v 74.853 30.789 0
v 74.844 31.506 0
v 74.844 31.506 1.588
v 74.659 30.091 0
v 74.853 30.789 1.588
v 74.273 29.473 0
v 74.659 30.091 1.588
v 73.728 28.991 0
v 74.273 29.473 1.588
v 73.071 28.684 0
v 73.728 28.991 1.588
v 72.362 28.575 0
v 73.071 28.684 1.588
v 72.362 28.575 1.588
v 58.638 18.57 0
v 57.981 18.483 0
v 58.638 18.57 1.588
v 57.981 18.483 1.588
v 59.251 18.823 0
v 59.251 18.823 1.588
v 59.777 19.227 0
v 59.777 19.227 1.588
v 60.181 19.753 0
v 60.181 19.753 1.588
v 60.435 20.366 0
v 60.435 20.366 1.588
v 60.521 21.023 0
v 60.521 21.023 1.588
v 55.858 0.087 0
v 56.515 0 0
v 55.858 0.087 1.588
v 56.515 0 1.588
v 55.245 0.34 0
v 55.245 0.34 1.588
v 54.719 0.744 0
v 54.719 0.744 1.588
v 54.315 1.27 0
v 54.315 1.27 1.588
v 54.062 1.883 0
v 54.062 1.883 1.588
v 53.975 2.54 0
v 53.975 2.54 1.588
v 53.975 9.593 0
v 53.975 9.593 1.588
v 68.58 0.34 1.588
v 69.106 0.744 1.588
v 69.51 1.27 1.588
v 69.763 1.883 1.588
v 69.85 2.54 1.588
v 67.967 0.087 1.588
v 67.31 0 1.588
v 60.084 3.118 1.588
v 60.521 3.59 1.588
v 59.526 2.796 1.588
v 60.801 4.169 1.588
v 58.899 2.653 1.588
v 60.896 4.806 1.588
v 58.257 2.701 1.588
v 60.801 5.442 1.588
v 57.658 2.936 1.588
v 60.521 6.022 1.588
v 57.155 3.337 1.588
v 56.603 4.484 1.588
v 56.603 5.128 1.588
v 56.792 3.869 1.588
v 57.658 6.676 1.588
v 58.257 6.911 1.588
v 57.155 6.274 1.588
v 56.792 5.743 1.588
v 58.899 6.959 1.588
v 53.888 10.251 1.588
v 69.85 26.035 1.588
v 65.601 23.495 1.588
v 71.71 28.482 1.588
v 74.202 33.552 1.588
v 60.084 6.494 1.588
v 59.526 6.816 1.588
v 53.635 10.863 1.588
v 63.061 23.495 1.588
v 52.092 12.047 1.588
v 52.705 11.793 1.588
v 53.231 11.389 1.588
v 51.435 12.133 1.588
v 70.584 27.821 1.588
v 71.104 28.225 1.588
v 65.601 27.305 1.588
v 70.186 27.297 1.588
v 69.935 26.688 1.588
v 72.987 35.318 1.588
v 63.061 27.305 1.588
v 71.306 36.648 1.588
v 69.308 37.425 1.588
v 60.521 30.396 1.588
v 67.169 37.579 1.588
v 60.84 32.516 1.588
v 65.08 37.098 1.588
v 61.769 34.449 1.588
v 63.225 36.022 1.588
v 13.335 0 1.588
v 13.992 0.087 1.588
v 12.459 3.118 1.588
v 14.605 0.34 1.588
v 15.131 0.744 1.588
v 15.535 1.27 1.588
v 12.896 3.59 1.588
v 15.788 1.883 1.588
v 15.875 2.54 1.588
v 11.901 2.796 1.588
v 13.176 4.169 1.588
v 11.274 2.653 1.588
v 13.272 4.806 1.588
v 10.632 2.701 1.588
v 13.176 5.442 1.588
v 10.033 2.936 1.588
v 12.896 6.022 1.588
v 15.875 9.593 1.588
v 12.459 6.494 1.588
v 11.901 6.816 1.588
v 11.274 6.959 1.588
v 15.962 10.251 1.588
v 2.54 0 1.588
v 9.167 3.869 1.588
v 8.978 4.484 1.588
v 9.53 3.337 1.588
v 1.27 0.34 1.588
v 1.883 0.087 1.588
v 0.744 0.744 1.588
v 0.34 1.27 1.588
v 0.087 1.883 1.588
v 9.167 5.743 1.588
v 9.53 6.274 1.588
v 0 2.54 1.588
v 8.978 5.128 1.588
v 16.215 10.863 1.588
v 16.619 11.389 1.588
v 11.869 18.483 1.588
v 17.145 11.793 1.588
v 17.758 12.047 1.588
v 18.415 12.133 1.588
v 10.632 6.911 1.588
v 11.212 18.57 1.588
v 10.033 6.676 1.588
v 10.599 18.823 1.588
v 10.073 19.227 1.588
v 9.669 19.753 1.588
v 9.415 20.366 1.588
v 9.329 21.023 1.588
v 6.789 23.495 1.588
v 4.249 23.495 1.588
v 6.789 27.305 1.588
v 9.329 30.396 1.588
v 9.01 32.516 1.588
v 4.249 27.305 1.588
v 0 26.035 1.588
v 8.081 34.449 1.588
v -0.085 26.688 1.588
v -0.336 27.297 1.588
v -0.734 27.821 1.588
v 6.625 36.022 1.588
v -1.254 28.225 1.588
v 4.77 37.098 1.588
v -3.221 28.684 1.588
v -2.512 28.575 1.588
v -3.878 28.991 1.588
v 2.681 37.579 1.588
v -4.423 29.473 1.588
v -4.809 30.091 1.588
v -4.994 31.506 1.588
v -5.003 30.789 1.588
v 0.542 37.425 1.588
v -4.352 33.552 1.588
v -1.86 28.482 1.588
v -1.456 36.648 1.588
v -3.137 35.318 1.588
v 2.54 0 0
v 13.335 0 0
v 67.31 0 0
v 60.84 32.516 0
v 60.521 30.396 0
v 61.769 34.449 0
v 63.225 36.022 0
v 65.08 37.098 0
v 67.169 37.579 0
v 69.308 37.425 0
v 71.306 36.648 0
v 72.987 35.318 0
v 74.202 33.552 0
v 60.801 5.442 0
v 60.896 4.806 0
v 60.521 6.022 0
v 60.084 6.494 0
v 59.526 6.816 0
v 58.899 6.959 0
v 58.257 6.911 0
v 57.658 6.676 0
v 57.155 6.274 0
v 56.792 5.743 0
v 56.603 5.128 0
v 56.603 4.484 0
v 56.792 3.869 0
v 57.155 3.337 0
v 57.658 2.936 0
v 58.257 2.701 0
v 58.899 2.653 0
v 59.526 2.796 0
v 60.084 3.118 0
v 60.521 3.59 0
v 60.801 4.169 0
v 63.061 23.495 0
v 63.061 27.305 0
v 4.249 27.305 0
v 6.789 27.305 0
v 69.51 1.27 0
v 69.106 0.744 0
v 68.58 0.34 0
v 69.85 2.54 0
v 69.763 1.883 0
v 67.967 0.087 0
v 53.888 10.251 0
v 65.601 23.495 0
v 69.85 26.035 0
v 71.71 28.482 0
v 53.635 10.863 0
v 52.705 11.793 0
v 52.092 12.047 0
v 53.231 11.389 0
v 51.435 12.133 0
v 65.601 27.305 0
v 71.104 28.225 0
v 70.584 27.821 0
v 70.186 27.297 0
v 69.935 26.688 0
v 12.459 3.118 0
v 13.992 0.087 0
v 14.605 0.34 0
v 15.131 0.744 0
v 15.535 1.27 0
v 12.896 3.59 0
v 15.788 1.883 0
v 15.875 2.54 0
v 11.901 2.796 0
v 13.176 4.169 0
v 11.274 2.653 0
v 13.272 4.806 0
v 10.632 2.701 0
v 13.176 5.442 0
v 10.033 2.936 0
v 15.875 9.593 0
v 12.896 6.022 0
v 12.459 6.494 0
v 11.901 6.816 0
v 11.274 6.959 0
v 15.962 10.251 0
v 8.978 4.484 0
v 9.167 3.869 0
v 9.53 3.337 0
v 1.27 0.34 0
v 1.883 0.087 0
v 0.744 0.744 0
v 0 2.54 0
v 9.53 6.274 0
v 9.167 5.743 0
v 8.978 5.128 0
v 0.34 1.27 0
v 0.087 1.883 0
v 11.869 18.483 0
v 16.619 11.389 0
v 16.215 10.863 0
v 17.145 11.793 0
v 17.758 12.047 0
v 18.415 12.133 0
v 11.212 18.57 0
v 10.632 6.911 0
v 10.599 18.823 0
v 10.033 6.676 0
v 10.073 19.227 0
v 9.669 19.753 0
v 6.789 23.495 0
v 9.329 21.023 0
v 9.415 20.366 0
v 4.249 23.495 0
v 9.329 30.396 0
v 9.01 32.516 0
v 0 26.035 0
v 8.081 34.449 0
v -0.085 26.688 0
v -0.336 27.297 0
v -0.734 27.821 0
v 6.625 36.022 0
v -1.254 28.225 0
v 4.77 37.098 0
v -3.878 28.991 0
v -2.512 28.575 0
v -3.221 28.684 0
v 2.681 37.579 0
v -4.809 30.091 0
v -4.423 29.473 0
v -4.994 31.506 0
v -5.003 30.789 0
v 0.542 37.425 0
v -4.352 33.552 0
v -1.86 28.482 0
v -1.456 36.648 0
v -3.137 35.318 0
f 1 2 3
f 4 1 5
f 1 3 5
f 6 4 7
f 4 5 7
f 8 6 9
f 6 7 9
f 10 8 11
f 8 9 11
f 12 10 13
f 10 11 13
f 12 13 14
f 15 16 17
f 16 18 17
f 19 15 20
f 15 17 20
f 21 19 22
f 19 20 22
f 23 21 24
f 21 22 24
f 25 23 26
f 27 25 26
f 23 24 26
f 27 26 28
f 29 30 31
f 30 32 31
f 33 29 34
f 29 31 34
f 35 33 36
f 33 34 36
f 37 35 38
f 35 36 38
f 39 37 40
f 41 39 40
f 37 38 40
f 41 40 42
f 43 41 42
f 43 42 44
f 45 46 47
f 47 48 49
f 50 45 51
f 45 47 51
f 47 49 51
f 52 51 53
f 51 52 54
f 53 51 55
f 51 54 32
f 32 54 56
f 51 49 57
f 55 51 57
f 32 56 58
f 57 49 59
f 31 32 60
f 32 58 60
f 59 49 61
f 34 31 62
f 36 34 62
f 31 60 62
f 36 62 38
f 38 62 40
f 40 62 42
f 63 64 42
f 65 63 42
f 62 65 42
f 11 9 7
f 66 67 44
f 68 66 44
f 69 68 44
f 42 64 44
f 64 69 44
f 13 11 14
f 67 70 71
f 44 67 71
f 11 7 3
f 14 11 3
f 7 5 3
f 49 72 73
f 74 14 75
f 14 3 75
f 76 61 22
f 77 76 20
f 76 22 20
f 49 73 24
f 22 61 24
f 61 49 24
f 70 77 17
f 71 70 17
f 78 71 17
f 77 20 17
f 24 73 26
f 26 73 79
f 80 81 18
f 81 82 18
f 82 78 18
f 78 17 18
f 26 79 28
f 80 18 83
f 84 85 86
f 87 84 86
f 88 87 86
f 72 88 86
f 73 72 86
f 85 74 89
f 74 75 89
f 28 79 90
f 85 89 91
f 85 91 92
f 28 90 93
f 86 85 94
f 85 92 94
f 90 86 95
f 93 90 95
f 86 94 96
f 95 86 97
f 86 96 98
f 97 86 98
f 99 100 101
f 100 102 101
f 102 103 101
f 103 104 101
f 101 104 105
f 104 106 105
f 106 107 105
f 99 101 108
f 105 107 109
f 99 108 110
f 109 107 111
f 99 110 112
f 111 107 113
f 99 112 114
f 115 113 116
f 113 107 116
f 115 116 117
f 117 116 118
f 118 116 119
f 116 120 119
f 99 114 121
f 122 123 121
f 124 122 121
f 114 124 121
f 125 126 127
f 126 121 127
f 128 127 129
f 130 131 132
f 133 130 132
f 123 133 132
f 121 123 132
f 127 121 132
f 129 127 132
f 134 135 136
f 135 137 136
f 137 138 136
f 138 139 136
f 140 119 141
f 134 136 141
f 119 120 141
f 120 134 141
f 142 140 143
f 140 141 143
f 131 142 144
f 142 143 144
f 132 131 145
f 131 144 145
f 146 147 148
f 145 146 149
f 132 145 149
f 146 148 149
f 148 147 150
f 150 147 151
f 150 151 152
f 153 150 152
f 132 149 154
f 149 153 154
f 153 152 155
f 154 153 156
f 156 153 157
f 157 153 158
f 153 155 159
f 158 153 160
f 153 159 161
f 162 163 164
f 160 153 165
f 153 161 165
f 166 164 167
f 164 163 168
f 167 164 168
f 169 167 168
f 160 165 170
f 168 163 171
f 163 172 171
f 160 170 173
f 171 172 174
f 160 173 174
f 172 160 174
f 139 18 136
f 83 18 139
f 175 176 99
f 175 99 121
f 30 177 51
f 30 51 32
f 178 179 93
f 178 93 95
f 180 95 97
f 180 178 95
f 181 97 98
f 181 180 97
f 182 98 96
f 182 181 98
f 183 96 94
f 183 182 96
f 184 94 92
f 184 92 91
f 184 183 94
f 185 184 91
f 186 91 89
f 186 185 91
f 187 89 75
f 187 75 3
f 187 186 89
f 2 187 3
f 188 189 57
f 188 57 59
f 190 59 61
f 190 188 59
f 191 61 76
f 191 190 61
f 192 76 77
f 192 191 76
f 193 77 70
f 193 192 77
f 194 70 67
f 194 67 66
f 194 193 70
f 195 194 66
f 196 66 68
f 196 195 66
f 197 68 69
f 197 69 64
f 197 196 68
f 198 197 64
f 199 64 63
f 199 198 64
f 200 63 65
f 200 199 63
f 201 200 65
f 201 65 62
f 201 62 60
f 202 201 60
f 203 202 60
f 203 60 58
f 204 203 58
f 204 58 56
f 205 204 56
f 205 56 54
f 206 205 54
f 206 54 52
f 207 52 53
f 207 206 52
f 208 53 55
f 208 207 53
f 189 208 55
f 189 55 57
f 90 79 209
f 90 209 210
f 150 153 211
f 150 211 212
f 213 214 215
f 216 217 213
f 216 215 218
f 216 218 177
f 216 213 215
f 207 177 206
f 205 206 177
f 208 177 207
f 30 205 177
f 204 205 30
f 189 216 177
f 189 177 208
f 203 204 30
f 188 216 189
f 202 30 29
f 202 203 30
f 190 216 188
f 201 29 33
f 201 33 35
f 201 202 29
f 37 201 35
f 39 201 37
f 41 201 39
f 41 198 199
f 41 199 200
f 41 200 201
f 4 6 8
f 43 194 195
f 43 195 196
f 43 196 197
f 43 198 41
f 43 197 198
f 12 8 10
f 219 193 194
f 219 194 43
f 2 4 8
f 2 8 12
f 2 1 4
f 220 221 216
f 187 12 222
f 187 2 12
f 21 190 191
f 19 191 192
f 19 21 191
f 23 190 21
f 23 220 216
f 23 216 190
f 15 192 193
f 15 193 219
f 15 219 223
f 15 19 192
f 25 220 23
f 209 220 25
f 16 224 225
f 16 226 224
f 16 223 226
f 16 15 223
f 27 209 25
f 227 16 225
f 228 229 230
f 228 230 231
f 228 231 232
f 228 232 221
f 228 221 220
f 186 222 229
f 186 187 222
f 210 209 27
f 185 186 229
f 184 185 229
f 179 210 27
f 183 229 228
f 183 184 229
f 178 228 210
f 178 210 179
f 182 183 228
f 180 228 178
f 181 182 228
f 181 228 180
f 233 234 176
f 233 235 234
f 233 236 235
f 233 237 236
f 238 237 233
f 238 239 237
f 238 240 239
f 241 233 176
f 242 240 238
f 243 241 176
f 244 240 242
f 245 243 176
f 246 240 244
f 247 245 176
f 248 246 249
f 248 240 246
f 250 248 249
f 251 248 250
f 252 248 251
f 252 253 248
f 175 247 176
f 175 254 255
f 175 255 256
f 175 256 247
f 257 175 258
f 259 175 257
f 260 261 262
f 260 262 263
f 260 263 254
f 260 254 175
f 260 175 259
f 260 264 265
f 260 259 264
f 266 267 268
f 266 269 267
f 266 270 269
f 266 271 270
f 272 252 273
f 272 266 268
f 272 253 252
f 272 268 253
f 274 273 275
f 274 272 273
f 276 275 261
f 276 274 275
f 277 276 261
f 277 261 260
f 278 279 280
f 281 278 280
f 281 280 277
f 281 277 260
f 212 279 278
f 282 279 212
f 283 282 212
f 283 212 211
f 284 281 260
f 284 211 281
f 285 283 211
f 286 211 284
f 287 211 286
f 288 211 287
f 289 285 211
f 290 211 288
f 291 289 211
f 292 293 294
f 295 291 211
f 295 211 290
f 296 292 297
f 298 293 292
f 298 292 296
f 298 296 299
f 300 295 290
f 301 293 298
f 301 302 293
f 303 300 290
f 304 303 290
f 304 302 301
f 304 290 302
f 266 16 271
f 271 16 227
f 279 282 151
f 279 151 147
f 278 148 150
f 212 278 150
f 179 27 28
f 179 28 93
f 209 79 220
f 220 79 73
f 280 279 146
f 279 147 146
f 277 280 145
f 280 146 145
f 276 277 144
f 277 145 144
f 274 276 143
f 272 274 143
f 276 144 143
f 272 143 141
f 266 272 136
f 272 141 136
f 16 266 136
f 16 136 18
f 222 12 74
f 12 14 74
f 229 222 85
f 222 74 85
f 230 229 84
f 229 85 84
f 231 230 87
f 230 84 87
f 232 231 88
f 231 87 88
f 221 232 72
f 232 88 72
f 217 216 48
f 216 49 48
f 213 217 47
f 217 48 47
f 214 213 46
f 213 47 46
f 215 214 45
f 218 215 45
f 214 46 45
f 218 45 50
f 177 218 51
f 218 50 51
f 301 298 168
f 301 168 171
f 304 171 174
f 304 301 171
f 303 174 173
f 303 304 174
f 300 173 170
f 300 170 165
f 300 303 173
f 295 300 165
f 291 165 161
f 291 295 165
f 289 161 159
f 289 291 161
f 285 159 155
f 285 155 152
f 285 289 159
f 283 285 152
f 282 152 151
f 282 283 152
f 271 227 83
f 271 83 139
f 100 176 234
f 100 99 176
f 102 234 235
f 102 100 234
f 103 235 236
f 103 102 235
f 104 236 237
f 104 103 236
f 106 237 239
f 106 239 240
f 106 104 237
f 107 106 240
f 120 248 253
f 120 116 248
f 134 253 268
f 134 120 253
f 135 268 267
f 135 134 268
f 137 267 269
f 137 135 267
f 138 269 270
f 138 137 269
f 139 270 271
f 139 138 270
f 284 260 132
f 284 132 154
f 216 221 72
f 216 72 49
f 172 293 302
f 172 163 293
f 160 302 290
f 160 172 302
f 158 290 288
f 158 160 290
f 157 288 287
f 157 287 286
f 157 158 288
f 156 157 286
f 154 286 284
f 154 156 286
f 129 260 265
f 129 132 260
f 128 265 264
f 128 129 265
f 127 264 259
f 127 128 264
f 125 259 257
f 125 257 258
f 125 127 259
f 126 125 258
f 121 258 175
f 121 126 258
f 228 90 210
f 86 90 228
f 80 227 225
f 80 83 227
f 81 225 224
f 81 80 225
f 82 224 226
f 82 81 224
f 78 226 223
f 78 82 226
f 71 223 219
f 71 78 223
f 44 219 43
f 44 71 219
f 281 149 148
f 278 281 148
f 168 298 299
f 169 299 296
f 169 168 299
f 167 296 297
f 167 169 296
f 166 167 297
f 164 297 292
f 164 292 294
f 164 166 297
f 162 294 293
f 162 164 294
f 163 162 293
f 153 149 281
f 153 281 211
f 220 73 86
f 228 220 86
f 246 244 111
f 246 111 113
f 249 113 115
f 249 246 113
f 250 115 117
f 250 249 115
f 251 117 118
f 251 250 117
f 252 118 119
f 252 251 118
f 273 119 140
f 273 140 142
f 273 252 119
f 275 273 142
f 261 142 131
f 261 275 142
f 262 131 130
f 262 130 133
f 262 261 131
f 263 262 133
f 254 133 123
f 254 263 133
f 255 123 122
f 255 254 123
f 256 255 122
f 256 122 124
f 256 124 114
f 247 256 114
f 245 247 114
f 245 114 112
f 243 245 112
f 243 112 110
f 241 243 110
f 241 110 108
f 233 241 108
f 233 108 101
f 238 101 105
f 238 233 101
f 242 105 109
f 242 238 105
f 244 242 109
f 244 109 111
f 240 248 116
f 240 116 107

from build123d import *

# Parameters (mm, degrees)
SKETCH1_R           = 2.159
BOSS_EXTRUDE1_DEPTH = 1.5875
SKETCH2_W           = 2.54
SKETCH2_H           = 3.81
CUT_EXTRUDE1_DEPTH  = 1.5875
FILLET1_R           = 2.54
FILLET2_R           = 2.54


with BuildPart() as part:
    # Sketch1 → Boss-Extrude1 (new body)
    with BuildSketch(Plane.XY):
        with BuildLine():
            Line((9.32893445, 30.396375958), (9.32893445, 18.483132928))
            Line((9.32893445, 18.483132928), (60.52106555, 18.483132928))
            Line((60.52106555, 18.483132928), (60.52106555, 30.396375958))
            ThreePointArc((60.52106555, 30.396375958), (67.725532775, 37.600843183), (74.93, 30.396375958))
            Line((74.93, 30.396375958), (74.93, 28.575))
            Line((74.93, 28.575), (69.85, 28.575))
            Line((69.85, 28.575), (69.85, 0))
            Line((69.85, 0), (53.975, 0))
            Line((53.975, 0), (53.975, 12.133132928))
            Line((53.975, 12.133132928), (15.875, 12.133132928))
            Line((15.875, 12.133132928), (15.875, 0))
            Line((15.875, 0), (0, 0))
            Line((0, 0), (0, 28.575))
            Line((0, 28.575), (-5.08, 28.575))
            Line((-5.08, 28.575), (-5.08, 30.396375958))
            ThreePointArc((-5.08, 30.396375958), (2.124467225, 37.600843183), (9.32893445, 30.396375958))
        make_face()
        with Locations((11.1125, 4.805875958)):
            Circle(SKETCH1_R, mode=Mode.SUBTRACT)
        with Locations((58.7375, 4.805875958)):
            Circle(SKETCH1_R, mode=Mode.SUBTRACT)
    extrude(amount=BOSS_EXTRUDE1_DEPTH)

    # Sketch2 → Cut-Extrude1 (cut)
    with BuildSketch(Plane.XY.offset(1.5875)):
        with Locations((5.51893445, 25.4)):
            Rectangle(SKETCH2_W, SKETCH2_H)
        with Locations((64.33106555, 25.4)):
            Rectangle(SKETCH2_W, SKETCH2_H)
    extrude(amount=-CUT_EXTRUDE1_DEPTH, mode=Mode.SUBTRACT)

    # Fillet1
    fillet1_edges = [part.edges().sort_by_distance(p)[0] for p in [
        (60.52106555, 18.483132928, 0.79375),
        (69.85, 28.575, 0.79375),
        (69.85, 0, 0.79375),
        (53.975, 0, 0.79375),
        (53.975, 12.133132928, 0.79375),
        (15.875, 12.133132928, 0.79375),
        (15.875, 0, 0.79375),
        (0, 0, 0.79375),
        (0, 28.575, 0.79375),
        (9.32893445, 18.483132928, 0.79375),
    ]]
    fillet(fillet1_edges, radius=FILLET1_R)

    # Fillet2
    fillet2_edges = [part.edges().sort_by_distance(p)[0] for p in [
        (-5.08, 28.575, 0.79375),
        (74.93, 28.575, 0.79375),
    ]]
    fillet(fillet2_edges, radius=FILLET2_R)


solid = part.part
